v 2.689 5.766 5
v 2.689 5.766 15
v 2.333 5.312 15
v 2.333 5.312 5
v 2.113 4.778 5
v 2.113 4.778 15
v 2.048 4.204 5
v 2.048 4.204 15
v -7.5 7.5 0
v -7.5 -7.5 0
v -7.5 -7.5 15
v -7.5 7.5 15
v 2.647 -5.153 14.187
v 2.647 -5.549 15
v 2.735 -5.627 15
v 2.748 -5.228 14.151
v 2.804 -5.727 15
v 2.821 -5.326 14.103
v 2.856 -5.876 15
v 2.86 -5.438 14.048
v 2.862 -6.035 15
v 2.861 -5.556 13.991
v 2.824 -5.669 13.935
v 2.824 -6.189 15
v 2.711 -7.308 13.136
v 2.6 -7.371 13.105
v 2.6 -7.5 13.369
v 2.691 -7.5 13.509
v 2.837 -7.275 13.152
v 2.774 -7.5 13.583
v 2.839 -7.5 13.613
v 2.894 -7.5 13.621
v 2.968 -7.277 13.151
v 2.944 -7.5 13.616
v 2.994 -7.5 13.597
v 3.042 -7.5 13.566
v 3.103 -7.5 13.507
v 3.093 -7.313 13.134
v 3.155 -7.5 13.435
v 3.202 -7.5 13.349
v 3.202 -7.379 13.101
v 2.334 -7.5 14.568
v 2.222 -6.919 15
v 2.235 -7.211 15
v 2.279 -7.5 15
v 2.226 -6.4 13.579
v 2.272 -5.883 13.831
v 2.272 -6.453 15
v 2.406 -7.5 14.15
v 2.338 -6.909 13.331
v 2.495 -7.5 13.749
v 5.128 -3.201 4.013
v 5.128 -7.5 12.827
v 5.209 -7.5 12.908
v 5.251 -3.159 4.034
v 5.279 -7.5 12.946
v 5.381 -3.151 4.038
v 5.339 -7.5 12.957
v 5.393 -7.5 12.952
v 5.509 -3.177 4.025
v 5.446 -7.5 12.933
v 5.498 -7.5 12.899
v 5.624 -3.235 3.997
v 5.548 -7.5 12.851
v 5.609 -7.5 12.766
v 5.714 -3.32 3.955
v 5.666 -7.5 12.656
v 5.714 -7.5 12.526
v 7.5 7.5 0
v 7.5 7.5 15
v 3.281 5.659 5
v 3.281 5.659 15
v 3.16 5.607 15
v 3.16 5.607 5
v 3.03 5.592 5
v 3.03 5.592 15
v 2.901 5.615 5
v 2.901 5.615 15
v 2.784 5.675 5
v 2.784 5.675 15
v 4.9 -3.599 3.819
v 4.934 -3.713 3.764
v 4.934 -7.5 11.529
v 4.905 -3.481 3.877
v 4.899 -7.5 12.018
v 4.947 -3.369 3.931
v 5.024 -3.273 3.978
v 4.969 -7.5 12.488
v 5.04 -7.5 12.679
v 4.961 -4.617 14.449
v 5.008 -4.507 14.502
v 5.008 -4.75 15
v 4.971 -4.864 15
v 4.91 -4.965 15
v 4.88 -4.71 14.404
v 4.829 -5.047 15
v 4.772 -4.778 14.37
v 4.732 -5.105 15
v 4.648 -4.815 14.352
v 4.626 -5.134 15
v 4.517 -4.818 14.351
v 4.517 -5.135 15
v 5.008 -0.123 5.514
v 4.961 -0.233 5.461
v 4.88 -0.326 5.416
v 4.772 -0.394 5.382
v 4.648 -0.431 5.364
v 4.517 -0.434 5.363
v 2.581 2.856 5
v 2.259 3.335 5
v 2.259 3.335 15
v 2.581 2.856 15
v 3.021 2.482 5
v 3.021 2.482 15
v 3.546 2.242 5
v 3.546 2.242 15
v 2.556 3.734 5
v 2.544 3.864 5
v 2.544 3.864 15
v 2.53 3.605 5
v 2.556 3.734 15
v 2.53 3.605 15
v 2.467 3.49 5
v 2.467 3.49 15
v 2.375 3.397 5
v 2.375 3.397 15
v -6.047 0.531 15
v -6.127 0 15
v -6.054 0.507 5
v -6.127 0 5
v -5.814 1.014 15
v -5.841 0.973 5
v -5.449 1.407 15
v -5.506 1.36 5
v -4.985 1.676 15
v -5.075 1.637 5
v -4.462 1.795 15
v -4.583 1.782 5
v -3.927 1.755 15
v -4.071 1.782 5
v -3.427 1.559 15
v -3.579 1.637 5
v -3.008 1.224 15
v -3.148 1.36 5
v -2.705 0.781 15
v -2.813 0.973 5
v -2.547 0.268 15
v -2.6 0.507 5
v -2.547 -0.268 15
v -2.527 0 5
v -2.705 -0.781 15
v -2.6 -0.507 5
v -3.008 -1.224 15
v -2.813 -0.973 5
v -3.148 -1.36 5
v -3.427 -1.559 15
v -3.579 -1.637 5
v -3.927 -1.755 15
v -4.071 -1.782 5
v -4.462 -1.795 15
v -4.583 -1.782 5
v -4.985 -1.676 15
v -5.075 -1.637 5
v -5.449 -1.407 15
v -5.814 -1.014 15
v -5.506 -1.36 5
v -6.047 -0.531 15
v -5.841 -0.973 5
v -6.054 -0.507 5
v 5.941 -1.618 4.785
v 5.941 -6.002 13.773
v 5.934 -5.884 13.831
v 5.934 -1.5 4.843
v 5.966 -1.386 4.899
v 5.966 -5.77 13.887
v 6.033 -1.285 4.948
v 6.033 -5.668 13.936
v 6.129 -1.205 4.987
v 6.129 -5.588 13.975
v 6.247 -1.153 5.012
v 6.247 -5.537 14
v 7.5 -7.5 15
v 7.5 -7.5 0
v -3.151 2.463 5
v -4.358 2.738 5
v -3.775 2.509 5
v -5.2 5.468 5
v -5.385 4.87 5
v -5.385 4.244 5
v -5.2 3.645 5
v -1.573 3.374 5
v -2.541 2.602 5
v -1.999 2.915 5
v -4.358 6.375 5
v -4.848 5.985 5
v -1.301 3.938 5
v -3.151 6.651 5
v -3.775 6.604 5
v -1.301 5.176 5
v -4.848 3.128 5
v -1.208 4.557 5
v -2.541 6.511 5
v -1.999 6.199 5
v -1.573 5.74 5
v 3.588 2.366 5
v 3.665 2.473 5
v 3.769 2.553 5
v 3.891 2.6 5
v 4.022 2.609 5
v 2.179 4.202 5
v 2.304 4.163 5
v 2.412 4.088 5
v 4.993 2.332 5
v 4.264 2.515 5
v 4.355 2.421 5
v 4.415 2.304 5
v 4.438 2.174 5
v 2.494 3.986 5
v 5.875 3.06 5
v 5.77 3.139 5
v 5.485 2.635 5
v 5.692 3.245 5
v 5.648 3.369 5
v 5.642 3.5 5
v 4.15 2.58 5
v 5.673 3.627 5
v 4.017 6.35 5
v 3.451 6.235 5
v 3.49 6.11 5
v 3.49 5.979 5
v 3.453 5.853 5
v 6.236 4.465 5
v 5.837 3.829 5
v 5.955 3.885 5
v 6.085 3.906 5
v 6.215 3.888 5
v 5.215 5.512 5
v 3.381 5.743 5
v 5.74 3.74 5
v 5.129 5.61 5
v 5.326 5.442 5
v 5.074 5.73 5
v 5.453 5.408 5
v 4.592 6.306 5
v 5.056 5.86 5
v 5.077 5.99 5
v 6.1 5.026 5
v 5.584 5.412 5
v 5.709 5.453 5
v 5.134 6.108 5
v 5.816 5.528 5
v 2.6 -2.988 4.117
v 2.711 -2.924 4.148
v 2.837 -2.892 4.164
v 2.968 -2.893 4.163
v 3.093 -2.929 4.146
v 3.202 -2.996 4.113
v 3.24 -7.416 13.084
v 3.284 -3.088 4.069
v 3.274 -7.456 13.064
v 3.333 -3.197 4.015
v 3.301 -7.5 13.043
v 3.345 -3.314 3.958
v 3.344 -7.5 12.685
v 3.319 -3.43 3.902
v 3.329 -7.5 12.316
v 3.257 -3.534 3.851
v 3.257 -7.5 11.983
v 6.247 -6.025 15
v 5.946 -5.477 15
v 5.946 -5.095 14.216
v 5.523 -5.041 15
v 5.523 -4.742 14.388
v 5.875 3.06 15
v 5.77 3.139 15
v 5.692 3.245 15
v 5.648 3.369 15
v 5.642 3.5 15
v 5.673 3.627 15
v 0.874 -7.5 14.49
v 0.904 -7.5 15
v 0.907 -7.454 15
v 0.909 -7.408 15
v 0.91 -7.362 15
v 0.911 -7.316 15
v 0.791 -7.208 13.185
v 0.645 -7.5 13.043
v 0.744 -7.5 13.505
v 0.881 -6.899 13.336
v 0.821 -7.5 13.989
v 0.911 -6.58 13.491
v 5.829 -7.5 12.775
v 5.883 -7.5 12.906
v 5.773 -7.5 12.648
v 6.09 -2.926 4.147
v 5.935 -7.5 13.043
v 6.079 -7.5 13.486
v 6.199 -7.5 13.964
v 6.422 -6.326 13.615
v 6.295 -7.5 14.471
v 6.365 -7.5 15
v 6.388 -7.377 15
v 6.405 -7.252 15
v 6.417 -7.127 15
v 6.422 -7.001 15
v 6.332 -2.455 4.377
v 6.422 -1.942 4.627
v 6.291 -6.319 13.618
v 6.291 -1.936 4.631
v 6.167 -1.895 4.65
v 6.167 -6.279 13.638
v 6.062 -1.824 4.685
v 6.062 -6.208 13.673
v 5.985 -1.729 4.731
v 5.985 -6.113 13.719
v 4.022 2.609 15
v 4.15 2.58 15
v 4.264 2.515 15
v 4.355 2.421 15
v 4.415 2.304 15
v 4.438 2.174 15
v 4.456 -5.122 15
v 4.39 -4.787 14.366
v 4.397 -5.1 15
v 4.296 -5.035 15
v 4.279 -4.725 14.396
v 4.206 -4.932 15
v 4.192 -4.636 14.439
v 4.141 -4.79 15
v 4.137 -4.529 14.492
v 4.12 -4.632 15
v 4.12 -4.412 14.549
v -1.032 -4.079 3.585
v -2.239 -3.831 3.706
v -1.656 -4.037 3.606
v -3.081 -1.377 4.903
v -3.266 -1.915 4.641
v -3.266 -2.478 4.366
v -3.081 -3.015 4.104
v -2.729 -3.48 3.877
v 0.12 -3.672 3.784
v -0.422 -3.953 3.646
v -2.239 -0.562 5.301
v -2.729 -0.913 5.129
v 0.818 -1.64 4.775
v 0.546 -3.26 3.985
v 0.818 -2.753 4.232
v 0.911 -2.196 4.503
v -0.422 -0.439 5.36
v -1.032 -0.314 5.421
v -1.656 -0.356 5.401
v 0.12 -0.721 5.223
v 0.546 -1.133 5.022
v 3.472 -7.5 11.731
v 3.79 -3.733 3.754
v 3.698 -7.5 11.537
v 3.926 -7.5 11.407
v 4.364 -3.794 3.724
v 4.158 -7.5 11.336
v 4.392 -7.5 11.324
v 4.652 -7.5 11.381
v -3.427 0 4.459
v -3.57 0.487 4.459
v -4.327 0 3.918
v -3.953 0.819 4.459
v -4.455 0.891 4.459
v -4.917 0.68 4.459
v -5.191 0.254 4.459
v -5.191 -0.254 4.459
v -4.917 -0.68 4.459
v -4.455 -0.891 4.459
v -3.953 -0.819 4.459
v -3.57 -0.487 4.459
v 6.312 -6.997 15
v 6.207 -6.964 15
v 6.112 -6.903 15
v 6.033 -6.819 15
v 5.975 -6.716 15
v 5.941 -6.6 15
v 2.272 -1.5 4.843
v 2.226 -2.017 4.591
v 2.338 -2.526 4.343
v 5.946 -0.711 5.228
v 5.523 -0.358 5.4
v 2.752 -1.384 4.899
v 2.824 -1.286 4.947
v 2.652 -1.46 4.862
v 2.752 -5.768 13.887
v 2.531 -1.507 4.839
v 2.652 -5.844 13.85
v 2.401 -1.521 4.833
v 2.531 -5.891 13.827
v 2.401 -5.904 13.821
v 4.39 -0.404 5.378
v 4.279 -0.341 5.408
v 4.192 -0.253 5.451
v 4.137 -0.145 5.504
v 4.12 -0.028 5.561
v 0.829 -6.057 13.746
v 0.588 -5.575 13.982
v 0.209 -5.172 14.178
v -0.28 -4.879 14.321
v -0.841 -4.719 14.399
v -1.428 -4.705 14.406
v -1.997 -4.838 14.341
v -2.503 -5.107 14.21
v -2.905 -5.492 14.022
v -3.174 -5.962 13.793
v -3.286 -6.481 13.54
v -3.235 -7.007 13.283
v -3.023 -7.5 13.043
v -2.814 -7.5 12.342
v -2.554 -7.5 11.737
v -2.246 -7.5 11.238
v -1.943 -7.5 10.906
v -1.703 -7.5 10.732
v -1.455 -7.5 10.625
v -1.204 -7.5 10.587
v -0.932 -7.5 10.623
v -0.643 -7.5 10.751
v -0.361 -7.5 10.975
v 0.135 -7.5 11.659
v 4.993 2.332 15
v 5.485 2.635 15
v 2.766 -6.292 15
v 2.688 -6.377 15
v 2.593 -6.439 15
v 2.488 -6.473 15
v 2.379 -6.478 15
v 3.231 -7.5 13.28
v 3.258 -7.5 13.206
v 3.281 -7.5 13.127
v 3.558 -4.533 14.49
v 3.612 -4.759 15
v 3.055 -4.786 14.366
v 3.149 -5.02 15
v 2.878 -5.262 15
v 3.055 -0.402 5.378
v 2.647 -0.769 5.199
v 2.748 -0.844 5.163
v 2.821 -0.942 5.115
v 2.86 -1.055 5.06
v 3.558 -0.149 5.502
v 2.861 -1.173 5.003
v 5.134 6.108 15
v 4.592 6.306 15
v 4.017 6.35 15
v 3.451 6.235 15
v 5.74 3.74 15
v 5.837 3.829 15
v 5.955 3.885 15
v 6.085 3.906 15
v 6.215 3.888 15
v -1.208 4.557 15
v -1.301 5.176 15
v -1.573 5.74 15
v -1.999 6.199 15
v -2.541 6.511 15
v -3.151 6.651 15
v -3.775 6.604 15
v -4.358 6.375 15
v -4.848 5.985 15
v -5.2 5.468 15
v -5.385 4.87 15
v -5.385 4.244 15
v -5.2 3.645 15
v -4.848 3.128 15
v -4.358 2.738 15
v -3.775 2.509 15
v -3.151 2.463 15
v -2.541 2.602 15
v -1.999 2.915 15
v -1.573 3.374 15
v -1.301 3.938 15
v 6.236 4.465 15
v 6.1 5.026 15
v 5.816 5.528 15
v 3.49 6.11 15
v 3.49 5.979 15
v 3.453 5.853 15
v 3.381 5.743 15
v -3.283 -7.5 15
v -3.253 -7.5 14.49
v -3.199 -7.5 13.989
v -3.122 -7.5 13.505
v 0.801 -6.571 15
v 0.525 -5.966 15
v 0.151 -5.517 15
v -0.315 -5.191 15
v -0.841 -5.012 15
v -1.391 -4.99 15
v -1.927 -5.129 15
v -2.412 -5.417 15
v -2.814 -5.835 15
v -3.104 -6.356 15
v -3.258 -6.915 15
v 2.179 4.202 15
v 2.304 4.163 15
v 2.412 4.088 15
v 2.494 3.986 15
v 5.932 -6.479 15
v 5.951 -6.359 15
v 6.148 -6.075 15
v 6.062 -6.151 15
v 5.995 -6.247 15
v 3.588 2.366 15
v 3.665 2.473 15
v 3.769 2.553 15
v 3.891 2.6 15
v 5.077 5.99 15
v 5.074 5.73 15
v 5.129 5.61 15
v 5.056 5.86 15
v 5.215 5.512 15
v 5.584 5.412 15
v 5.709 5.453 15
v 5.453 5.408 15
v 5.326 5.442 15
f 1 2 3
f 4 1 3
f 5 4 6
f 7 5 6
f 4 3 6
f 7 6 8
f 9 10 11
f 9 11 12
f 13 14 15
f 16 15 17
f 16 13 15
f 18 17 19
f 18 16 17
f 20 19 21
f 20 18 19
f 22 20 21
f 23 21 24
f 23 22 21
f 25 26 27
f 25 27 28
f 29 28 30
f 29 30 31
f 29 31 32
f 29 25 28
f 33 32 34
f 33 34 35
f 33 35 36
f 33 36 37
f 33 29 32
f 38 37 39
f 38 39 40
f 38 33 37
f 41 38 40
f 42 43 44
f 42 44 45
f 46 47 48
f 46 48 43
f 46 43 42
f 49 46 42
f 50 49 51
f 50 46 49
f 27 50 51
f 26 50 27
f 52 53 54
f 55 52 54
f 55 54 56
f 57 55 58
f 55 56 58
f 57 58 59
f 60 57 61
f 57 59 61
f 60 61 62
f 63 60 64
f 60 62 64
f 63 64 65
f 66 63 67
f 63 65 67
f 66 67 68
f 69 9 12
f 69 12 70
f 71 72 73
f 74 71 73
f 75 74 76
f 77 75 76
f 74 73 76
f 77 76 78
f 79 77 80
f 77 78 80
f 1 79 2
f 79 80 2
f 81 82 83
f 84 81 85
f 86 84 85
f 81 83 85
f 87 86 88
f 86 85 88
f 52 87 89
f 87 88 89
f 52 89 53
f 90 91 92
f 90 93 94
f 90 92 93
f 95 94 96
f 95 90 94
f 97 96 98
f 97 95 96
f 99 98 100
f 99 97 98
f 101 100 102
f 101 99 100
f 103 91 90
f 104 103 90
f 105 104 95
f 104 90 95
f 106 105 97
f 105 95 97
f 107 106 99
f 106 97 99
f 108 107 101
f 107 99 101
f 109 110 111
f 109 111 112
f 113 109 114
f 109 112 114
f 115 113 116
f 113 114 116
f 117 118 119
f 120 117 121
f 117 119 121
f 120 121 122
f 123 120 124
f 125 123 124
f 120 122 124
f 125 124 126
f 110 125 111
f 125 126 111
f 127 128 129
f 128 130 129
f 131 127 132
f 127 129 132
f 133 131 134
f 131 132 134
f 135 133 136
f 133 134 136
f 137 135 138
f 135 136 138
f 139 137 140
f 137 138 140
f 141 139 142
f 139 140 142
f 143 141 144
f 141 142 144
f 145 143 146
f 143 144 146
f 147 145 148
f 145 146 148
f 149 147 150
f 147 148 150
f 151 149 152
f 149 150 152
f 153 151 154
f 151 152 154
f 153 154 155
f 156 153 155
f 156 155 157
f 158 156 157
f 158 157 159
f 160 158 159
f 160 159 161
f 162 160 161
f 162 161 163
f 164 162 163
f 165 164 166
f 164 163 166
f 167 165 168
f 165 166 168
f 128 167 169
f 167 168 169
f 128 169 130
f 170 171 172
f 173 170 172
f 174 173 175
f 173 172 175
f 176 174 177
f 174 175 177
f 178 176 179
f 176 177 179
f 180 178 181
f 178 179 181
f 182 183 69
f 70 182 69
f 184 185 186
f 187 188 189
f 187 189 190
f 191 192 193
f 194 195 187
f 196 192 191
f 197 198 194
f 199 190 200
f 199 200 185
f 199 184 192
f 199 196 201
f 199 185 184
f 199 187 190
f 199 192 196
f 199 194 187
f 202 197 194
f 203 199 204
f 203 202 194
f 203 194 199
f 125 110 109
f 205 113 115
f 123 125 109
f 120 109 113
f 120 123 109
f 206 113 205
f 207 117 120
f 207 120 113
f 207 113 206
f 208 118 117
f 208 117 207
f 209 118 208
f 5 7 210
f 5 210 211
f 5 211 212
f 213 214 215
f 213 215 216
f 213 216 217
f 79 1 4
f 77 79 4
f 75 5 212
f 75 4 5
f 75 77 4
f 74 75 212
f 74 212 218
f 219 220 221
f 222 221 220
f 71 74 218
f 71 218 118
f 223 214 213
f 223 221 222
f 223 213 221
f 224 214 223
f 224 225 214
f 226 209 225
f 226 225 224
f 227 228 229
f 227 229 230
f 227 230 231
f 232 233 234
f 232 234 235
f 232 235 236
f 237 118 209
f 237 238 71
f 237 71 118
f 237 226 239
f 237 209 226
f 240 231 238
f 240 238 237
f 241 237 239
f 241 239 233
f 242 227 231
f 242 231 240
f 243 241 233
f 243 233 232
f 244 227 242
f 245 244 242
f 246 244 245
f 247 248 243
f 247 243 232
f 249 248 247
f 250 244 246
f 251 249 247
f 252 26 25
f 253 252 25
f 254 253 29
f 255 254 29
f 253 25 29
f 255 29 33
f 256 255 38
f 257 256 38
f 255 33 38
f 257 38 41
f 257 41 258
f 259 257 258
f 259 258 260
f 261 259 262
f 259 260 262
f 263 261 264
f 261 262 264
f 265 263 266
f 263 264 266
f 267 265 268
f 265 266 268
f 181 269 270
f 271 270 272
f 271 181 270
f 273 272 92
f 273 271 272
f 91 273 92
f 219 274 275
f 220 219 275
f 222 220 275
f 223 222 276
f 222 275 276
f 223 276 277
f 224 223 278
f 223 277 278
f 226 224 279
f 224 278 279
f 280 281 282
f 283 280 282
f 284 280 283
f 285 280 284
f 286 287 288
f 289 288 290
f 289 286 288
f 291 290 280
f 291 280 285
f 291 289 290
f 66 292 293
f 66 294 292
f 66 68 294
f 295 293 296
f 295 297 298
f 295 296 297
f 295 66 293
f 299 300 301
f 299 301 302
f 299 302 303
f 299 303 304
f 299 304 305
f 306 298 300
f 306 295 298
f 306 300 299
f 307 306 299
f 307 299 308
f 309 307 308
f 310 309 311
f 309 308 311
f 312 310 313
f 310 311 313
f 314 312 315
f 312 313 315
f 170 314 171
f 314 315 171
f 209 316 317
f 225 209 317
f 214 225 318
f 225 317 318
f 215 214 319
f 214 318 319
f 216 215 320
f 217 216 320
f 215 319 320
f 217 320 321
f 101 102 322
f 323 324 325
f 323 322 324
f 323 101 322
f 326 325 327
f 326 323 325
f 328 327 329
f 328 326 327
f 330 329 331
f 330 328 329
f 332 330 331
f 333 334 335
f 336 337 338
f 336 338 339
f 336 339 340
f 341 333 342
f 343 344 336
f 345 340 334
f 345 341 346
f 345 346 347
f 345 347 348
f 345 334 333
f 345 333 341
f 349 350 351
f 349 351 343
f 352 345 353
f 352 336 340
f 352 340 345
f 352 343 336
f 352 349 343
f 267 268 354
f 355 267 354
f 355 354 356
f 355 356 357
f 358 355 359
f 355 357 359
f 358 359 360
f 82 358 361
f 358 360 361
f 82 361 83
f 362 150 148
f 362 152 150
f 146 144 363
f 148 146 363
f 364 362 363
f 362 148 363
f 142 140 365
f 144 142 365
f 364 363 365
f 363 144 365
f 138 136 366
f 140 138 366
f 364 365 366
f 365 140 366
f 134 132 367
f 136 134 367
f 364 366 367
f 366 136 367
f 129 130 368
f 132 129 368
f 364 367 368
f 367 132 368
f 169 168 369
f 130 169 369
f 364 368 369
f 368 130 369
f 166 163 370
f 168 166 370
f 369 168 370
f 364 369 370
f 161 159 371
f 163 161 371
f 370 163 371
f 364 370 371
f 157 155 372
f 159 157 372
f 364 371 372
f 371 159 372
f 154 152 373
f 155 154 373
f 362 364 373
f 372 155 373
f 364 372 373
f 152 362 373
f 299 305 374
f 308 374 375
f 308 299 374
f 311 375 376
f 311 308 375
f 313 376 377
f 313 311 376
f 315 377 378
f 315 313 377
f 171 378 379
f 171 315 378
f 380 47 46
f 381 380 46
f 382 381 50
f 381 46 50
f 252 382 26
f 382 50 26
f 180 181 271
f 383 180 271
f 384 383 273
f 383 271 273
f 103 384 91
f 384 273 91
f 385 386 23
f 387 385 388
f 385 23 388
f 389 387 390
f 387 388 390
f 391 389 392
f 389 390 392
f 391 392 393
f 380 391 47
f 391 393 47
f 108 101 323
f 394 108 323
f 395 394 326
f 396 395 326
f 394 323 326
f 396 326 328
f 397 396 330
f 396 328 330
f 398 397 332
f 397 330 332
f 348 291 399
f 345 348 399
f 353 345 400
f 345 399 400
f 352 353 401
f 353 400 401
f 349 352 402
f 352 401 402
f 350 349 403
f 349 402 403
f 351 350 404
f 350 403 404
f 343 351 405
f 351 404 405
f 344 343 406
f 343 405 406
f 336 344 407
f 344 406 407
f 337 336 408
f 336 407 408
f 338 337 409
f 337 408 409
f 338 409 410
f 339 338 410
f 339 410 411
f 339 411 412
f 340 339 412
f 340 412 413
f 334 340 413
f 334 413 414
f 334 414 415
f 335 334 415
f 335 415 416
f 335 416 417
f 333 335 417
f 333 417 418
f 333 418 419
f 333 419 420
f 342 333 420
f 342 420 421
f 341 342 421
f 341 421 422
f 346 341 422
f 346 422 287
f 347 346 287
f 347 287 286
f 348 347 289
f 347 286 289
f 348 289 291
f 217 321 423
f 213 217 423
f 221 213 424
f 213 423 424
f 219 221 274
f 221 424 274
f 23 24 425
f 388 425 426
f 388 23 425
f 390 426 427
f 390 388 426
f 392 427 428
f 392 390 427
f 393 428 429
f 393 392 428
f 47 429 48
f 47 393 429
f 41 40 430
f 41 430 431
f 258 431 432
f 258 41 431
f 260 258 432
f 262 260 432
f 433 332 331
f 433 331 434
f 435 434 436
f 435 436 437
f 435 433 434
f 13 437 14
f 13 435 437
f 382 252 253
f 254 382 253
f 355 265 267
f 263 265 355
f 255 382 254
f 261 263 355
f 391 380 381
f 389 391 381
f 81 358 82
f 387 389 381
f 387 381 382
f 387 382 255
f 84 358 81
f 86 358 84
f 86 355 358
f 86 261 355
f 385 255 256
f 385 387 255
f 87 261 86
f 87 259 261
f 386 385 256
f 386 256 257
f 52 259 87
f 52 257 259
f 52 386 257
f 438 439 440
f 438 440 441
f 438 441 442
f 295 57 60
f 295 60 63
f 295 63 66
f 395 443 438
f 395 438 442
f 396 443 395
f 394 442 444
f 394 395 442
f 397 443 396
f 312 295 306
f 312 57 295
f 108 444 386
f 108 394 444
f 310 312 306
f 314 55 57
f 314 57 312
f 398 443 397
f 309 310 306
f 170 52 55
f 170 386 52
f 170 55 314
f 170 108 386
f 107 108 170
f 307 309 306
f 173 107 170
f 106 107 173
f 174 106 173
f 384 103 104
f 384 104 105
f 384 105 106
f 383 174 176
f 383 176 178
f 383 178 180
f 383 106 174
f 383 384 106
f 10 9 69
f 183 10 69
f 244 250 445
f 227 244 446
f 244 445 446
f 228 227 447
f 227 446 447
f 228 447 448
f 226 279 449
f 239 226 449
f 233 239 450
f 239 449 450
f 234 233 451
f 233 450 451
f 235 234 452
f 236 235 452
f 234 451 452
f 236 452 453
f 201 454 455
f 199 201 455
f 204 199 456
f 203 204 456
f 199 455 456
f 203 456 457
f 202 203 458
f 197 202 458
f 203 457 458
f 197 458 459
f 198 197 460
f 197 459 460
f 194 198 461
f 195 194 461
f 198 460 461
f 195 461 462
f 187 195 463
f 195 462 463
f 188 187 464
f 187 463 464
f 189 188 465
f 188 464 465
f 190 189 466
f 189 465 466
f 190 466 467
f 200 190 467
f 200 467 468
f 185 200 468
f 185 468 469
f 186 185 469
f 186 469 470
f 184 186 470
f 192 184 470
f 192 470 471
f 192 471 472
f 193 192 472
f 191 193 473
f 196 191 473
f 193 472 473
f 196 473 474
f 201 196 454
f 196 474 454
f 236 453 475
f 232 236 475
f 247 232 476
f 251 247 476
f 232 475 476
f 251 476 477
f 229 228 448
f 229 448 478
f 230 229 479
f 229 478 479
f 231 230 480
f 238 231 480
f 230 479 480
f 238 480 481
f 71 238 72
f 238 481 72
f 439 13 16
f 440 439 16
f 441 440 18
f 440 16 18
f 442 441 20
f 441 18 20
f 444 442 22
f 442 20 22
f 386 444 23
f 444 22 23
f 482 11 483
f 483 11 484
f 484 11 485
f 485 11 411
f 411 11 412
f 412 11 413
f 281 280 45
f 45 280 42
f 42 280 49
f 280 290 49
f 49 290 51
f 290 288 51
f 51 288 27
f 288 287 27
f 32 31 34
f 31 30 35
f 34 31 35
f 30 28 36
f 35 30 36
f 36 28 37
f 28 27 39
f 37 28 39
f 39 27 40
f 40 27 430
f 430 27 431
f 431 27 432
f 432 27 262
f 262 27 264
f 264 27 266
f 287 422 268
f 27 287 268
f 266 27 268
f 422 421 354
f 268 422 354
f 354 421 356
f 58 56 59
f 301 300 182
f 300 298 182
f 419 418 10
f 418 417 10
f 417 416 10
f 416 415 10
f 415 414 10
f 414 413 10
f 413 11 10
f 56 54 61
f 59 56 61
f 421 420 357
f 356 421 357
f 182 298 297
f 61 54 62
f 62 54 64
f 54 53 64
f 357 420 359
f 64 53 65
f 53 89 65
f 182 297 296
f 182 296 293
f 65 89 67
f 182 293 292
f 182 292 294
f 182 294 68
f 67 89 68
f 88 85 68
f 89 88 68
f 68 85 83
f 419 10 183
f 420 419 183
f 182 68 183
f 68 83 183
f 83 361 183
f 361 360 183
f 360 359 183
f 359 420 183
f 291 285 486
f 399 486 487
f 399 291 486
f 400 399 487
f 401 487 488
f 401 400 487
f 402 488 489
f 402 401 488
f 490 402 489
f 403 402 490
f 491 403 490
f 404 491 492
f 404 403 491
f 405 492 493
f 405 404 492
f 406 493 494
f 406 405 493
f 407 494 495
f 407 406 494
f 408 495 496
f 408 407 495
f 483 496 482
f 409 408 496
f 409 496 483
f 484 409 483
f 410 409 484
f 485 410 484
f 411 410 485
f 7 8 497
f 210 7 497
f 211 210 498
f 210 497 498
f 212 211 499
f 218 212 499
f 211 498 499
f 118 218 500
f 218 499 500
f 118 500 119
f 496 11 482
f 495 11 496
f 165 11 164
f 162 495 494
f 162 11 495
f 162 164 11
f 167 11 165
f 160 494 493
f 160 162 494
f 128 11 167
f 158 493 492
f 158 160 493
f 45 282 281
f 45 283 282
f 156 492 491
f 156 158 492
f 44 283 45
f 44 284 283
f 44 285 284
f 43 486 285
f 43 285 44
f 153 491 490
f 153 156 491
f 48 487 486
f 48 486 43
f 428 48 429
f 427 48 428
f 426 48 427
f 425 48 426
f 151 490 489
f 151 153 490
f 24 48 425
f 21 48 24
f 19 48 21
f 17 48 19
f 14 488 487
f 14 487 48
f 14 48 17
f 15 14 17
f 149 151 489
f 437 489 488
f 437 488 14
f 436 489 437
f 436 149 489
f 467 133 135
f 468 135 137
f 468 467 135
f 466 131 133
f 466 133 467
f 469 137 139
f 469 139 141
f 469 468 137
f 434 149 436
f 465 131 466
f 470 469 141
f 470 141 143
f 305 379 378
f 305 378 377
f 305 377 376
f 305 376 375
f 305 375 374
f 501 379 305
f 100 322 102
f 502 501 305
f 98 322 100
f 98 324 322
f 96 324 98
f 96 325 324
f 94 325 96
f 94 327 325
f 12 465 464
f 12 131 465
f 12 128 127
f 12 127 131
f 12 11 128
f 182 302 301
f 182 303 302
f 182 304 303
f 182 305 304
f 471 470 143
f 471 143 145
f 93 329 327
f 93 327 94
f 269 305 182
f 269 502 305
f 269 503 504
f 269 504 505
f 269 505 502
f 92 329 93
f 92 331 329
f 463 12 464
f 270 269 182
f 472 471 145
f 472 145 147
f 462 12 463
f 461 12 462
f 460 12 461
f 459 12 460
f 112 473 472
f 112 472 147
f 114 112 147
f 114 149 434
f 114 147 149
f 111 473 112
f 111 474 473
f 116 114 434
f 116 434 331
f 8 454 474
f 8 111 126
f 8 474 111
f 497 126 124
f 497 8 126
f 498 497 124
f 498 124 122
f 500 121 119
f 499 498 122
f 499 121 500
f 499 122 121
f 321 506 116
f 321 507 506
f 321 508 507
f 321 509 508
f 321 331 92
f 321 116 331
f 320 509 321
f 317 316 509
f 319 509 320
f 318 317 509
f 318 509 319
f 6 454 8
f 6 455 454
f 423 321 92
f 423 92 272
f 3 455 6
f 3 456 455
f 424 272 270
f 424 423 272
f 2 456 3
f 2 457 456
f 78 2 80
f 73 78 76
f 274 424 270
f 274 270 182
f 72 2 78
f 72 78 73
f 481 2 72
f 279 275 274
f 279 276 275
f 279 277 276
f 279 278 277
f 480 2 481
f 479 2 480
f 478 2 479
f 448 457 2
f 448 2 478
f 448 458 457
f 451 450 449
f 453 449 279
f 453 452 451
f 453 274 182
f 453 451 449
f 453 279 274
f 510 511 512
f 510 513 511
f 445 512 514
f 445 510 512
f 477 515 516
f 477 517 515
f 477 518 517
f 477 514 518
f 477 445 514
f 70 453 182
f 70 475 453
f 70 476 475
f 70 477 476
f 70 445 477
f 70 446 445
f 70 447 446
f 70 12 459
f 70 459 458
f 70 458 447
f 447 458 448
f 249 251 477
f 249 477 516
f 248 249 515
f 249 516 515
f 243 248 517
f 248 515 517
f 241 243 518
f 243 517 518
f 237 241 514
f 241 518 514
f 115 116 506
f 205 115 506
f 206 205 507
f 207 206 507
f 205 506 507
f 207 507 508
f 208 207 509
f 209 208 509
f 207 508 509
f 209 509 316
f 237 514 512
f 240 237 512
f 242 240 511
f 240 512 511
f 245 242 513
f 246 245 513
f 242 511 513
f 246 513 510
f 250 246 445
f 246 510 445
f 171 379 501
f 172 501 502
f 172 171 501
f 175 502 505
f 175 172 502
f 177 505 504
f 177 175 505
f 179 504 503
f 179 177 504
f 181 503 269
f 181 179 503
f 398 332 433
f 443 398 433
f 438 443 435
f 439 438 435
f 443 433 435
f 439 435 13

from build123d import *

# Parameters (mm, degrees)
F0_W           = 15
F0_H           = 15
F1_DEPTH       = 15
F2_R           = 2.1
F3_DEPTH       = 10
F4_DEPTH       = 10
F6_D           = 3.6
F6_DEPTH       = 10
F6_TIP         = 1.0815491142
F9_R           = 2.1
F10_DEPTH      = 10
F10_DEPTH_BACK = 10
F11_DEPTH      = 10
F11_DEPTH_BACK = 10


with BuildPart() as f1:
    # F0 (on Top) → F1 (new body)
    with BuildSketch(Plane.XY):
        Rectangle(F0_W, F0_H)
    extrude(amount=F1_DEPTH)

    # F2 (on face) → F3 (cut)
    with BuildSketch(Plane.XY.offset(15)):
        with Locations((-3.3081052825, 4.5566549525)):
            Circle(F2_R)
    extrude(amount=-F3_DEPTH, mode=Mode.SUBTRACT)

    # F2 (on face) → F4 (cut)
    with BuildSketch(Plane.XY.offset(15)):
        with BuildLine():
            ThreePointArc((3.2809909909, 5.6586071096), (4.271900841, 5.899439318), (5.2151213678, 5.5118344659))
            ThreePointArc((5.2151213678, 5.5118344659), (5.0605091693, 5.7942622045), (5.1341789855, 6.1076997863))
            ThreePointArc((5.1341789855, 6.1076997863), (4.3059514618, 6.3481491967), (3.450923876, 6.2354346119))
            ThreePointArc((3.450923876, 6.2354346119), (3.4764516514, 5.9144693594), (3.2809909909, 5.6586071096))
        make_face()
        with BuildLine():
            ThreePointArc((3.5456670252, 2.2421209971), (3.7136732609, 2.5167921893), (4.0221963108, 2.608900206))
            ThreePointArc((4.0221963108, 2.608900206), (3.0789758, 2.9965050415), (2.5437227765, 3.8644950423))
            ThreePointArc((2.5437227765, 3.8644950423), (2.5027997945, 3.5451274527), (2.2589656824, 3.334853171))
            ThreePointArc((2.2589656824, 3.334853171), (2.787683207, 2.6535055877), (3.5456670252, 2.2421209971))
        make_face()
        with BuildLine():
            ThreePointArc((5.8747835443, 3.0604646595), (5.6654725032, 3.3051261397), (5.6732114262, 3.6270119283))
            ThreePointArc((5.6732114262, 3.6270119283), (5.0131061422, 2.8497324056), (4.0221963108, 2.608900206))
            ThreePointArc((4.0221963108, 2.608900206), (4.313287058, 2.471290132), (4.4379209082, 2.174411775))
            ThreePointArc((4.4379209082, 2.174411775), (5.2493036675, 2.4667040397), (5.8747835443, 3.0604646595))
        make_face()
        with BuildLine():
            ThreePointArc((5.2151213678, 5.5118344659), (5.644516455, 4.9470549944), (5.7970485739, 4.2541697621))
            ThreePointArc((5.7970485739, 4.2541697621), (5.7657932583, 3.9345361486), (5.6732114262, 3.6270119283))
            ThreePointArc((5.6732114262, 3.6270119283), (5.8940383698, 3.8613318458), (6.2149004544, 3.8881252289))
            ThreePointArc((6.2149004544, 3.8881252289), (6.1876450529, 4.7501193664), (5.816229058, 5.5284682012))
            ThreePointArc((5.816229058, 5.5284682012), (5.5188614887, 5.4050061266), (5.2151213678, 5.5118344659))
        make_face()
        with BuildLine():
            ThreePointArc((2.5437227765, 3.8644950423), (2.6208857067, 4.8813275594), (3.2809909909, 5.6586071096))
            ThreePointArc((3.2809909909, 5.6586071096), (2.9646084595, 5.598837153), (2.6892768391, 5.7657588495))
            ThreePointArc((2.6892768391, 5.7657588495), (2.2046594805, 5.0523706202), (2.0476393662, 4.204360341))
            ThreePointArc((2.0476393662, 4.204360341), (2.360783986, 4.1294549747), (2.5437227765, 3.8644950423))
        make_face()
        with BuildLine():
            ThreePointArc((5.6732114262, 3.6270119283), (5.7657932583, 3.9345361486), (5.7970485739, 4.2541697621))
            ThreePointArc((5.7970485739, 4.2541697621), (5.644516455, 4.9470549944), (5.2151213678, 5.5118344659))
            ThreePointArc((5.2151213678, 5.5118344659), (4.271900841, 5.899439318), (3.2809909909, 5.6586071096))
            ThreePointArc((3.2809909909, 5.6586071096), (2.6208857067, 4.8813275594), (2.5437227765, 3.8644950423))
            ThreePointArc((2.5437227765, 3.8644950423), (3.0789758, 2.9965050415), (4.0221963108, 2.608900206))
            ThreePointArc((4.0221963108, 2.608900206), (5.0131061422, 2.8497324056), (5.6732114262, 3.6270119283))
        make_face()
    extrude(amount=-F4_DEPTH, mode=Mode.SUBTRACT)

    # F6
    with Locations(Plane.XY.offset(15)):
        with Locations((-4.327217117, 0)):
            Hole(F6_D / 2, depth=F6_DEPTH)
            with Locations((0, 0, -(F6_DEPTH + F6_TIP / 2))):  # 118° drill point
                Cone(0, F6_D / 2, F6_TIP, mode=Mode.SUBTRACT)

    # F9 (on line) → F10 (cut, two sides)
    with BuildSketch(Plane(origin=(0, -6.5801176454, 13.4912404864), x_dir=(1, 0, 0), z_dir=(0, -0.4383711468, 0.8987940463))) as f10_sk:
        with Locations((-1.1891657487, 0)):
            Circle(F9_R)
    extrude(amount=-F10_DEPTH, mode=Mode.SUBTRACT)
    extrude(f10_sk.sketch, amount=F10_DEPTH_BACK, mode=Mode.SUBTRACT)

    # F9 (on line) → F11 (cut, two sides)
    with BuildSketch(Plane(origin=(0, -6.5801176454, 13.4912404864), x_dir=(1, 0, 0), z_dir=(0, -0.4383711468, 0.8987940463))) as f11_sk:
        with BuildLine():
            ThreePointArc((4.9336170518, -1.6870876514), (4.9217202173, -1.3653287012), (5.1278529304, -1.117983474))
            ThreePointArc((5.1278529304, -1.117983474), (4.1276234932, -1.3165874448), (3.2016843949, -0.8893413207))
            ThreePointArc((3.2016843949, -0.8893413207), (3.3441834561, -1.178070216), (3.2572910424, -1.4881025786))
            ThreePointArc((3.2572910424, -1.4881025786), (4.0745795038, -1.7634502148), (4.9336170518, -1.6870876514))
        make_face()
        with BuildLine():
            ThreePointArc((2.6004119701, -0.8804748841), (2.9027465931, -0.7697313384), (3.2016843949, -0.8893413207))
            ThreePointArc((3.2016843949, -0.8893413207), (2.7037129005, 0.0005613942), (2.823917186, 1.0132081149))
            ThreePointArc((2.823917186, 1.0132081149), (2.5933543197, 0.7884613294), (2.2716447953, 0.7752956598))
            ThreePointArc((2.2716447953, 0.7752956598), (2.2623296555, -0.0870789562), (2.6004119701, -0.8804748841))
        make_face()
        with BuildLine():
            ThreePointArc((5.1278529304, -1.117983474), (5.7454877945, -0.5126676326), (5.9721181259, 0.3219093778))
            ThreePointArc((5.9721181259, 0.3219093778), (5.9642004358, 0.483358092), (5.9405233533, 0.6432573507))
            ThreePointArc((5.9405233533, 0.6432573507), (5.4425518562, 1.5331600768), (4.5166127528, 1.9604062012))
            ThreePointArc((4.5166127528, 1.9604062012), (3.5163833114, 1.7618022241), (2.823917186, 1.0132081149))
            ThreePointArc((2.823917186, 1.0132081149), (2.7037129005, 0.0005613942), (3.2016843949, -0.8893413207))
            ThreePointArc((3.2016843949, -0.8893413207), (4.1276234932, -1.3165874448), (5.1278529304, -1.117983474))
        make_face()
        with BuildLine():
            ThreePointArc((5.9405233533, 0.6432573507), (5.9642004358, 0.483358092), (5.9721181259, 0.3219093778))
            ThreePointArc((5.9721181259, 0.3219093778), (5.7454877945, -0.5126676326), (5.1278529304, -1.117983474))
            ThreePointArc((5.1278529304, -1.117983474), (5.4464850598, -1.0716809479), (5.7144921267, -1.2501258132))
            ThreePointArc((5.7144921267, -1.2501258132), (6.2289193143, -0.5579253952), (6.4217514019, 0.2826651924))
            ThreePointArc((6.4217514019, 0.2826651924), (6.1120641324, 0.3707796135), (5.9405233533, 0.6432573507))
        make_face()
        with BuildLine():
            ThreePointArc((4.5166127528, 1.9604062012), (5.4425518562, 1.5331600768), (5.9405233533, 0.6432573507))
            ThreePointArc((5.9405233533, 0.6432573507), (5.9949497762, 0.9606027823), (6.2474796669, 1.1603501546))
            ThreePointArc((6.2474796669, 1.1603501546), (5.7481246921, 1.8635011762), (5.0082639284, 2.3066521666))
            ThreePointArc((5.0082639284, 2.3066521666), (4.8287635013, 2.039350922), (4.5166127528, 1.9604062012))
        make_face()
        with BuildLine():
            ThreePointArc((2.823917186, 1.0132081149), (3.5163833114, 1.7618022241), (4.5166127528, 1.9604062012))
            ThreePointArc((4.5166127528, 1.9604062012), (4.2316180075, 2.1102339389), (4.119682998, 2.4121294665))
            ThreePointArc((4.119682998, 2.4121294665), (3.2966374636, 2.1545002791), (2.646546277, 1.5877920657))
            ThreePointArc((2.646546277, 1.5877920657), (2.8452961865, 1.3344763829), (2.823917186, 1.0132081149))
        make_face()
    extrude(amount=-F11_DEPTH, mode=Mode.SUBTRACT)
    extrude(f11_sk.sketch, amount=F11_DEPTH_BACK, mode=Mode.SUBTRACT)


solid = f1.part
